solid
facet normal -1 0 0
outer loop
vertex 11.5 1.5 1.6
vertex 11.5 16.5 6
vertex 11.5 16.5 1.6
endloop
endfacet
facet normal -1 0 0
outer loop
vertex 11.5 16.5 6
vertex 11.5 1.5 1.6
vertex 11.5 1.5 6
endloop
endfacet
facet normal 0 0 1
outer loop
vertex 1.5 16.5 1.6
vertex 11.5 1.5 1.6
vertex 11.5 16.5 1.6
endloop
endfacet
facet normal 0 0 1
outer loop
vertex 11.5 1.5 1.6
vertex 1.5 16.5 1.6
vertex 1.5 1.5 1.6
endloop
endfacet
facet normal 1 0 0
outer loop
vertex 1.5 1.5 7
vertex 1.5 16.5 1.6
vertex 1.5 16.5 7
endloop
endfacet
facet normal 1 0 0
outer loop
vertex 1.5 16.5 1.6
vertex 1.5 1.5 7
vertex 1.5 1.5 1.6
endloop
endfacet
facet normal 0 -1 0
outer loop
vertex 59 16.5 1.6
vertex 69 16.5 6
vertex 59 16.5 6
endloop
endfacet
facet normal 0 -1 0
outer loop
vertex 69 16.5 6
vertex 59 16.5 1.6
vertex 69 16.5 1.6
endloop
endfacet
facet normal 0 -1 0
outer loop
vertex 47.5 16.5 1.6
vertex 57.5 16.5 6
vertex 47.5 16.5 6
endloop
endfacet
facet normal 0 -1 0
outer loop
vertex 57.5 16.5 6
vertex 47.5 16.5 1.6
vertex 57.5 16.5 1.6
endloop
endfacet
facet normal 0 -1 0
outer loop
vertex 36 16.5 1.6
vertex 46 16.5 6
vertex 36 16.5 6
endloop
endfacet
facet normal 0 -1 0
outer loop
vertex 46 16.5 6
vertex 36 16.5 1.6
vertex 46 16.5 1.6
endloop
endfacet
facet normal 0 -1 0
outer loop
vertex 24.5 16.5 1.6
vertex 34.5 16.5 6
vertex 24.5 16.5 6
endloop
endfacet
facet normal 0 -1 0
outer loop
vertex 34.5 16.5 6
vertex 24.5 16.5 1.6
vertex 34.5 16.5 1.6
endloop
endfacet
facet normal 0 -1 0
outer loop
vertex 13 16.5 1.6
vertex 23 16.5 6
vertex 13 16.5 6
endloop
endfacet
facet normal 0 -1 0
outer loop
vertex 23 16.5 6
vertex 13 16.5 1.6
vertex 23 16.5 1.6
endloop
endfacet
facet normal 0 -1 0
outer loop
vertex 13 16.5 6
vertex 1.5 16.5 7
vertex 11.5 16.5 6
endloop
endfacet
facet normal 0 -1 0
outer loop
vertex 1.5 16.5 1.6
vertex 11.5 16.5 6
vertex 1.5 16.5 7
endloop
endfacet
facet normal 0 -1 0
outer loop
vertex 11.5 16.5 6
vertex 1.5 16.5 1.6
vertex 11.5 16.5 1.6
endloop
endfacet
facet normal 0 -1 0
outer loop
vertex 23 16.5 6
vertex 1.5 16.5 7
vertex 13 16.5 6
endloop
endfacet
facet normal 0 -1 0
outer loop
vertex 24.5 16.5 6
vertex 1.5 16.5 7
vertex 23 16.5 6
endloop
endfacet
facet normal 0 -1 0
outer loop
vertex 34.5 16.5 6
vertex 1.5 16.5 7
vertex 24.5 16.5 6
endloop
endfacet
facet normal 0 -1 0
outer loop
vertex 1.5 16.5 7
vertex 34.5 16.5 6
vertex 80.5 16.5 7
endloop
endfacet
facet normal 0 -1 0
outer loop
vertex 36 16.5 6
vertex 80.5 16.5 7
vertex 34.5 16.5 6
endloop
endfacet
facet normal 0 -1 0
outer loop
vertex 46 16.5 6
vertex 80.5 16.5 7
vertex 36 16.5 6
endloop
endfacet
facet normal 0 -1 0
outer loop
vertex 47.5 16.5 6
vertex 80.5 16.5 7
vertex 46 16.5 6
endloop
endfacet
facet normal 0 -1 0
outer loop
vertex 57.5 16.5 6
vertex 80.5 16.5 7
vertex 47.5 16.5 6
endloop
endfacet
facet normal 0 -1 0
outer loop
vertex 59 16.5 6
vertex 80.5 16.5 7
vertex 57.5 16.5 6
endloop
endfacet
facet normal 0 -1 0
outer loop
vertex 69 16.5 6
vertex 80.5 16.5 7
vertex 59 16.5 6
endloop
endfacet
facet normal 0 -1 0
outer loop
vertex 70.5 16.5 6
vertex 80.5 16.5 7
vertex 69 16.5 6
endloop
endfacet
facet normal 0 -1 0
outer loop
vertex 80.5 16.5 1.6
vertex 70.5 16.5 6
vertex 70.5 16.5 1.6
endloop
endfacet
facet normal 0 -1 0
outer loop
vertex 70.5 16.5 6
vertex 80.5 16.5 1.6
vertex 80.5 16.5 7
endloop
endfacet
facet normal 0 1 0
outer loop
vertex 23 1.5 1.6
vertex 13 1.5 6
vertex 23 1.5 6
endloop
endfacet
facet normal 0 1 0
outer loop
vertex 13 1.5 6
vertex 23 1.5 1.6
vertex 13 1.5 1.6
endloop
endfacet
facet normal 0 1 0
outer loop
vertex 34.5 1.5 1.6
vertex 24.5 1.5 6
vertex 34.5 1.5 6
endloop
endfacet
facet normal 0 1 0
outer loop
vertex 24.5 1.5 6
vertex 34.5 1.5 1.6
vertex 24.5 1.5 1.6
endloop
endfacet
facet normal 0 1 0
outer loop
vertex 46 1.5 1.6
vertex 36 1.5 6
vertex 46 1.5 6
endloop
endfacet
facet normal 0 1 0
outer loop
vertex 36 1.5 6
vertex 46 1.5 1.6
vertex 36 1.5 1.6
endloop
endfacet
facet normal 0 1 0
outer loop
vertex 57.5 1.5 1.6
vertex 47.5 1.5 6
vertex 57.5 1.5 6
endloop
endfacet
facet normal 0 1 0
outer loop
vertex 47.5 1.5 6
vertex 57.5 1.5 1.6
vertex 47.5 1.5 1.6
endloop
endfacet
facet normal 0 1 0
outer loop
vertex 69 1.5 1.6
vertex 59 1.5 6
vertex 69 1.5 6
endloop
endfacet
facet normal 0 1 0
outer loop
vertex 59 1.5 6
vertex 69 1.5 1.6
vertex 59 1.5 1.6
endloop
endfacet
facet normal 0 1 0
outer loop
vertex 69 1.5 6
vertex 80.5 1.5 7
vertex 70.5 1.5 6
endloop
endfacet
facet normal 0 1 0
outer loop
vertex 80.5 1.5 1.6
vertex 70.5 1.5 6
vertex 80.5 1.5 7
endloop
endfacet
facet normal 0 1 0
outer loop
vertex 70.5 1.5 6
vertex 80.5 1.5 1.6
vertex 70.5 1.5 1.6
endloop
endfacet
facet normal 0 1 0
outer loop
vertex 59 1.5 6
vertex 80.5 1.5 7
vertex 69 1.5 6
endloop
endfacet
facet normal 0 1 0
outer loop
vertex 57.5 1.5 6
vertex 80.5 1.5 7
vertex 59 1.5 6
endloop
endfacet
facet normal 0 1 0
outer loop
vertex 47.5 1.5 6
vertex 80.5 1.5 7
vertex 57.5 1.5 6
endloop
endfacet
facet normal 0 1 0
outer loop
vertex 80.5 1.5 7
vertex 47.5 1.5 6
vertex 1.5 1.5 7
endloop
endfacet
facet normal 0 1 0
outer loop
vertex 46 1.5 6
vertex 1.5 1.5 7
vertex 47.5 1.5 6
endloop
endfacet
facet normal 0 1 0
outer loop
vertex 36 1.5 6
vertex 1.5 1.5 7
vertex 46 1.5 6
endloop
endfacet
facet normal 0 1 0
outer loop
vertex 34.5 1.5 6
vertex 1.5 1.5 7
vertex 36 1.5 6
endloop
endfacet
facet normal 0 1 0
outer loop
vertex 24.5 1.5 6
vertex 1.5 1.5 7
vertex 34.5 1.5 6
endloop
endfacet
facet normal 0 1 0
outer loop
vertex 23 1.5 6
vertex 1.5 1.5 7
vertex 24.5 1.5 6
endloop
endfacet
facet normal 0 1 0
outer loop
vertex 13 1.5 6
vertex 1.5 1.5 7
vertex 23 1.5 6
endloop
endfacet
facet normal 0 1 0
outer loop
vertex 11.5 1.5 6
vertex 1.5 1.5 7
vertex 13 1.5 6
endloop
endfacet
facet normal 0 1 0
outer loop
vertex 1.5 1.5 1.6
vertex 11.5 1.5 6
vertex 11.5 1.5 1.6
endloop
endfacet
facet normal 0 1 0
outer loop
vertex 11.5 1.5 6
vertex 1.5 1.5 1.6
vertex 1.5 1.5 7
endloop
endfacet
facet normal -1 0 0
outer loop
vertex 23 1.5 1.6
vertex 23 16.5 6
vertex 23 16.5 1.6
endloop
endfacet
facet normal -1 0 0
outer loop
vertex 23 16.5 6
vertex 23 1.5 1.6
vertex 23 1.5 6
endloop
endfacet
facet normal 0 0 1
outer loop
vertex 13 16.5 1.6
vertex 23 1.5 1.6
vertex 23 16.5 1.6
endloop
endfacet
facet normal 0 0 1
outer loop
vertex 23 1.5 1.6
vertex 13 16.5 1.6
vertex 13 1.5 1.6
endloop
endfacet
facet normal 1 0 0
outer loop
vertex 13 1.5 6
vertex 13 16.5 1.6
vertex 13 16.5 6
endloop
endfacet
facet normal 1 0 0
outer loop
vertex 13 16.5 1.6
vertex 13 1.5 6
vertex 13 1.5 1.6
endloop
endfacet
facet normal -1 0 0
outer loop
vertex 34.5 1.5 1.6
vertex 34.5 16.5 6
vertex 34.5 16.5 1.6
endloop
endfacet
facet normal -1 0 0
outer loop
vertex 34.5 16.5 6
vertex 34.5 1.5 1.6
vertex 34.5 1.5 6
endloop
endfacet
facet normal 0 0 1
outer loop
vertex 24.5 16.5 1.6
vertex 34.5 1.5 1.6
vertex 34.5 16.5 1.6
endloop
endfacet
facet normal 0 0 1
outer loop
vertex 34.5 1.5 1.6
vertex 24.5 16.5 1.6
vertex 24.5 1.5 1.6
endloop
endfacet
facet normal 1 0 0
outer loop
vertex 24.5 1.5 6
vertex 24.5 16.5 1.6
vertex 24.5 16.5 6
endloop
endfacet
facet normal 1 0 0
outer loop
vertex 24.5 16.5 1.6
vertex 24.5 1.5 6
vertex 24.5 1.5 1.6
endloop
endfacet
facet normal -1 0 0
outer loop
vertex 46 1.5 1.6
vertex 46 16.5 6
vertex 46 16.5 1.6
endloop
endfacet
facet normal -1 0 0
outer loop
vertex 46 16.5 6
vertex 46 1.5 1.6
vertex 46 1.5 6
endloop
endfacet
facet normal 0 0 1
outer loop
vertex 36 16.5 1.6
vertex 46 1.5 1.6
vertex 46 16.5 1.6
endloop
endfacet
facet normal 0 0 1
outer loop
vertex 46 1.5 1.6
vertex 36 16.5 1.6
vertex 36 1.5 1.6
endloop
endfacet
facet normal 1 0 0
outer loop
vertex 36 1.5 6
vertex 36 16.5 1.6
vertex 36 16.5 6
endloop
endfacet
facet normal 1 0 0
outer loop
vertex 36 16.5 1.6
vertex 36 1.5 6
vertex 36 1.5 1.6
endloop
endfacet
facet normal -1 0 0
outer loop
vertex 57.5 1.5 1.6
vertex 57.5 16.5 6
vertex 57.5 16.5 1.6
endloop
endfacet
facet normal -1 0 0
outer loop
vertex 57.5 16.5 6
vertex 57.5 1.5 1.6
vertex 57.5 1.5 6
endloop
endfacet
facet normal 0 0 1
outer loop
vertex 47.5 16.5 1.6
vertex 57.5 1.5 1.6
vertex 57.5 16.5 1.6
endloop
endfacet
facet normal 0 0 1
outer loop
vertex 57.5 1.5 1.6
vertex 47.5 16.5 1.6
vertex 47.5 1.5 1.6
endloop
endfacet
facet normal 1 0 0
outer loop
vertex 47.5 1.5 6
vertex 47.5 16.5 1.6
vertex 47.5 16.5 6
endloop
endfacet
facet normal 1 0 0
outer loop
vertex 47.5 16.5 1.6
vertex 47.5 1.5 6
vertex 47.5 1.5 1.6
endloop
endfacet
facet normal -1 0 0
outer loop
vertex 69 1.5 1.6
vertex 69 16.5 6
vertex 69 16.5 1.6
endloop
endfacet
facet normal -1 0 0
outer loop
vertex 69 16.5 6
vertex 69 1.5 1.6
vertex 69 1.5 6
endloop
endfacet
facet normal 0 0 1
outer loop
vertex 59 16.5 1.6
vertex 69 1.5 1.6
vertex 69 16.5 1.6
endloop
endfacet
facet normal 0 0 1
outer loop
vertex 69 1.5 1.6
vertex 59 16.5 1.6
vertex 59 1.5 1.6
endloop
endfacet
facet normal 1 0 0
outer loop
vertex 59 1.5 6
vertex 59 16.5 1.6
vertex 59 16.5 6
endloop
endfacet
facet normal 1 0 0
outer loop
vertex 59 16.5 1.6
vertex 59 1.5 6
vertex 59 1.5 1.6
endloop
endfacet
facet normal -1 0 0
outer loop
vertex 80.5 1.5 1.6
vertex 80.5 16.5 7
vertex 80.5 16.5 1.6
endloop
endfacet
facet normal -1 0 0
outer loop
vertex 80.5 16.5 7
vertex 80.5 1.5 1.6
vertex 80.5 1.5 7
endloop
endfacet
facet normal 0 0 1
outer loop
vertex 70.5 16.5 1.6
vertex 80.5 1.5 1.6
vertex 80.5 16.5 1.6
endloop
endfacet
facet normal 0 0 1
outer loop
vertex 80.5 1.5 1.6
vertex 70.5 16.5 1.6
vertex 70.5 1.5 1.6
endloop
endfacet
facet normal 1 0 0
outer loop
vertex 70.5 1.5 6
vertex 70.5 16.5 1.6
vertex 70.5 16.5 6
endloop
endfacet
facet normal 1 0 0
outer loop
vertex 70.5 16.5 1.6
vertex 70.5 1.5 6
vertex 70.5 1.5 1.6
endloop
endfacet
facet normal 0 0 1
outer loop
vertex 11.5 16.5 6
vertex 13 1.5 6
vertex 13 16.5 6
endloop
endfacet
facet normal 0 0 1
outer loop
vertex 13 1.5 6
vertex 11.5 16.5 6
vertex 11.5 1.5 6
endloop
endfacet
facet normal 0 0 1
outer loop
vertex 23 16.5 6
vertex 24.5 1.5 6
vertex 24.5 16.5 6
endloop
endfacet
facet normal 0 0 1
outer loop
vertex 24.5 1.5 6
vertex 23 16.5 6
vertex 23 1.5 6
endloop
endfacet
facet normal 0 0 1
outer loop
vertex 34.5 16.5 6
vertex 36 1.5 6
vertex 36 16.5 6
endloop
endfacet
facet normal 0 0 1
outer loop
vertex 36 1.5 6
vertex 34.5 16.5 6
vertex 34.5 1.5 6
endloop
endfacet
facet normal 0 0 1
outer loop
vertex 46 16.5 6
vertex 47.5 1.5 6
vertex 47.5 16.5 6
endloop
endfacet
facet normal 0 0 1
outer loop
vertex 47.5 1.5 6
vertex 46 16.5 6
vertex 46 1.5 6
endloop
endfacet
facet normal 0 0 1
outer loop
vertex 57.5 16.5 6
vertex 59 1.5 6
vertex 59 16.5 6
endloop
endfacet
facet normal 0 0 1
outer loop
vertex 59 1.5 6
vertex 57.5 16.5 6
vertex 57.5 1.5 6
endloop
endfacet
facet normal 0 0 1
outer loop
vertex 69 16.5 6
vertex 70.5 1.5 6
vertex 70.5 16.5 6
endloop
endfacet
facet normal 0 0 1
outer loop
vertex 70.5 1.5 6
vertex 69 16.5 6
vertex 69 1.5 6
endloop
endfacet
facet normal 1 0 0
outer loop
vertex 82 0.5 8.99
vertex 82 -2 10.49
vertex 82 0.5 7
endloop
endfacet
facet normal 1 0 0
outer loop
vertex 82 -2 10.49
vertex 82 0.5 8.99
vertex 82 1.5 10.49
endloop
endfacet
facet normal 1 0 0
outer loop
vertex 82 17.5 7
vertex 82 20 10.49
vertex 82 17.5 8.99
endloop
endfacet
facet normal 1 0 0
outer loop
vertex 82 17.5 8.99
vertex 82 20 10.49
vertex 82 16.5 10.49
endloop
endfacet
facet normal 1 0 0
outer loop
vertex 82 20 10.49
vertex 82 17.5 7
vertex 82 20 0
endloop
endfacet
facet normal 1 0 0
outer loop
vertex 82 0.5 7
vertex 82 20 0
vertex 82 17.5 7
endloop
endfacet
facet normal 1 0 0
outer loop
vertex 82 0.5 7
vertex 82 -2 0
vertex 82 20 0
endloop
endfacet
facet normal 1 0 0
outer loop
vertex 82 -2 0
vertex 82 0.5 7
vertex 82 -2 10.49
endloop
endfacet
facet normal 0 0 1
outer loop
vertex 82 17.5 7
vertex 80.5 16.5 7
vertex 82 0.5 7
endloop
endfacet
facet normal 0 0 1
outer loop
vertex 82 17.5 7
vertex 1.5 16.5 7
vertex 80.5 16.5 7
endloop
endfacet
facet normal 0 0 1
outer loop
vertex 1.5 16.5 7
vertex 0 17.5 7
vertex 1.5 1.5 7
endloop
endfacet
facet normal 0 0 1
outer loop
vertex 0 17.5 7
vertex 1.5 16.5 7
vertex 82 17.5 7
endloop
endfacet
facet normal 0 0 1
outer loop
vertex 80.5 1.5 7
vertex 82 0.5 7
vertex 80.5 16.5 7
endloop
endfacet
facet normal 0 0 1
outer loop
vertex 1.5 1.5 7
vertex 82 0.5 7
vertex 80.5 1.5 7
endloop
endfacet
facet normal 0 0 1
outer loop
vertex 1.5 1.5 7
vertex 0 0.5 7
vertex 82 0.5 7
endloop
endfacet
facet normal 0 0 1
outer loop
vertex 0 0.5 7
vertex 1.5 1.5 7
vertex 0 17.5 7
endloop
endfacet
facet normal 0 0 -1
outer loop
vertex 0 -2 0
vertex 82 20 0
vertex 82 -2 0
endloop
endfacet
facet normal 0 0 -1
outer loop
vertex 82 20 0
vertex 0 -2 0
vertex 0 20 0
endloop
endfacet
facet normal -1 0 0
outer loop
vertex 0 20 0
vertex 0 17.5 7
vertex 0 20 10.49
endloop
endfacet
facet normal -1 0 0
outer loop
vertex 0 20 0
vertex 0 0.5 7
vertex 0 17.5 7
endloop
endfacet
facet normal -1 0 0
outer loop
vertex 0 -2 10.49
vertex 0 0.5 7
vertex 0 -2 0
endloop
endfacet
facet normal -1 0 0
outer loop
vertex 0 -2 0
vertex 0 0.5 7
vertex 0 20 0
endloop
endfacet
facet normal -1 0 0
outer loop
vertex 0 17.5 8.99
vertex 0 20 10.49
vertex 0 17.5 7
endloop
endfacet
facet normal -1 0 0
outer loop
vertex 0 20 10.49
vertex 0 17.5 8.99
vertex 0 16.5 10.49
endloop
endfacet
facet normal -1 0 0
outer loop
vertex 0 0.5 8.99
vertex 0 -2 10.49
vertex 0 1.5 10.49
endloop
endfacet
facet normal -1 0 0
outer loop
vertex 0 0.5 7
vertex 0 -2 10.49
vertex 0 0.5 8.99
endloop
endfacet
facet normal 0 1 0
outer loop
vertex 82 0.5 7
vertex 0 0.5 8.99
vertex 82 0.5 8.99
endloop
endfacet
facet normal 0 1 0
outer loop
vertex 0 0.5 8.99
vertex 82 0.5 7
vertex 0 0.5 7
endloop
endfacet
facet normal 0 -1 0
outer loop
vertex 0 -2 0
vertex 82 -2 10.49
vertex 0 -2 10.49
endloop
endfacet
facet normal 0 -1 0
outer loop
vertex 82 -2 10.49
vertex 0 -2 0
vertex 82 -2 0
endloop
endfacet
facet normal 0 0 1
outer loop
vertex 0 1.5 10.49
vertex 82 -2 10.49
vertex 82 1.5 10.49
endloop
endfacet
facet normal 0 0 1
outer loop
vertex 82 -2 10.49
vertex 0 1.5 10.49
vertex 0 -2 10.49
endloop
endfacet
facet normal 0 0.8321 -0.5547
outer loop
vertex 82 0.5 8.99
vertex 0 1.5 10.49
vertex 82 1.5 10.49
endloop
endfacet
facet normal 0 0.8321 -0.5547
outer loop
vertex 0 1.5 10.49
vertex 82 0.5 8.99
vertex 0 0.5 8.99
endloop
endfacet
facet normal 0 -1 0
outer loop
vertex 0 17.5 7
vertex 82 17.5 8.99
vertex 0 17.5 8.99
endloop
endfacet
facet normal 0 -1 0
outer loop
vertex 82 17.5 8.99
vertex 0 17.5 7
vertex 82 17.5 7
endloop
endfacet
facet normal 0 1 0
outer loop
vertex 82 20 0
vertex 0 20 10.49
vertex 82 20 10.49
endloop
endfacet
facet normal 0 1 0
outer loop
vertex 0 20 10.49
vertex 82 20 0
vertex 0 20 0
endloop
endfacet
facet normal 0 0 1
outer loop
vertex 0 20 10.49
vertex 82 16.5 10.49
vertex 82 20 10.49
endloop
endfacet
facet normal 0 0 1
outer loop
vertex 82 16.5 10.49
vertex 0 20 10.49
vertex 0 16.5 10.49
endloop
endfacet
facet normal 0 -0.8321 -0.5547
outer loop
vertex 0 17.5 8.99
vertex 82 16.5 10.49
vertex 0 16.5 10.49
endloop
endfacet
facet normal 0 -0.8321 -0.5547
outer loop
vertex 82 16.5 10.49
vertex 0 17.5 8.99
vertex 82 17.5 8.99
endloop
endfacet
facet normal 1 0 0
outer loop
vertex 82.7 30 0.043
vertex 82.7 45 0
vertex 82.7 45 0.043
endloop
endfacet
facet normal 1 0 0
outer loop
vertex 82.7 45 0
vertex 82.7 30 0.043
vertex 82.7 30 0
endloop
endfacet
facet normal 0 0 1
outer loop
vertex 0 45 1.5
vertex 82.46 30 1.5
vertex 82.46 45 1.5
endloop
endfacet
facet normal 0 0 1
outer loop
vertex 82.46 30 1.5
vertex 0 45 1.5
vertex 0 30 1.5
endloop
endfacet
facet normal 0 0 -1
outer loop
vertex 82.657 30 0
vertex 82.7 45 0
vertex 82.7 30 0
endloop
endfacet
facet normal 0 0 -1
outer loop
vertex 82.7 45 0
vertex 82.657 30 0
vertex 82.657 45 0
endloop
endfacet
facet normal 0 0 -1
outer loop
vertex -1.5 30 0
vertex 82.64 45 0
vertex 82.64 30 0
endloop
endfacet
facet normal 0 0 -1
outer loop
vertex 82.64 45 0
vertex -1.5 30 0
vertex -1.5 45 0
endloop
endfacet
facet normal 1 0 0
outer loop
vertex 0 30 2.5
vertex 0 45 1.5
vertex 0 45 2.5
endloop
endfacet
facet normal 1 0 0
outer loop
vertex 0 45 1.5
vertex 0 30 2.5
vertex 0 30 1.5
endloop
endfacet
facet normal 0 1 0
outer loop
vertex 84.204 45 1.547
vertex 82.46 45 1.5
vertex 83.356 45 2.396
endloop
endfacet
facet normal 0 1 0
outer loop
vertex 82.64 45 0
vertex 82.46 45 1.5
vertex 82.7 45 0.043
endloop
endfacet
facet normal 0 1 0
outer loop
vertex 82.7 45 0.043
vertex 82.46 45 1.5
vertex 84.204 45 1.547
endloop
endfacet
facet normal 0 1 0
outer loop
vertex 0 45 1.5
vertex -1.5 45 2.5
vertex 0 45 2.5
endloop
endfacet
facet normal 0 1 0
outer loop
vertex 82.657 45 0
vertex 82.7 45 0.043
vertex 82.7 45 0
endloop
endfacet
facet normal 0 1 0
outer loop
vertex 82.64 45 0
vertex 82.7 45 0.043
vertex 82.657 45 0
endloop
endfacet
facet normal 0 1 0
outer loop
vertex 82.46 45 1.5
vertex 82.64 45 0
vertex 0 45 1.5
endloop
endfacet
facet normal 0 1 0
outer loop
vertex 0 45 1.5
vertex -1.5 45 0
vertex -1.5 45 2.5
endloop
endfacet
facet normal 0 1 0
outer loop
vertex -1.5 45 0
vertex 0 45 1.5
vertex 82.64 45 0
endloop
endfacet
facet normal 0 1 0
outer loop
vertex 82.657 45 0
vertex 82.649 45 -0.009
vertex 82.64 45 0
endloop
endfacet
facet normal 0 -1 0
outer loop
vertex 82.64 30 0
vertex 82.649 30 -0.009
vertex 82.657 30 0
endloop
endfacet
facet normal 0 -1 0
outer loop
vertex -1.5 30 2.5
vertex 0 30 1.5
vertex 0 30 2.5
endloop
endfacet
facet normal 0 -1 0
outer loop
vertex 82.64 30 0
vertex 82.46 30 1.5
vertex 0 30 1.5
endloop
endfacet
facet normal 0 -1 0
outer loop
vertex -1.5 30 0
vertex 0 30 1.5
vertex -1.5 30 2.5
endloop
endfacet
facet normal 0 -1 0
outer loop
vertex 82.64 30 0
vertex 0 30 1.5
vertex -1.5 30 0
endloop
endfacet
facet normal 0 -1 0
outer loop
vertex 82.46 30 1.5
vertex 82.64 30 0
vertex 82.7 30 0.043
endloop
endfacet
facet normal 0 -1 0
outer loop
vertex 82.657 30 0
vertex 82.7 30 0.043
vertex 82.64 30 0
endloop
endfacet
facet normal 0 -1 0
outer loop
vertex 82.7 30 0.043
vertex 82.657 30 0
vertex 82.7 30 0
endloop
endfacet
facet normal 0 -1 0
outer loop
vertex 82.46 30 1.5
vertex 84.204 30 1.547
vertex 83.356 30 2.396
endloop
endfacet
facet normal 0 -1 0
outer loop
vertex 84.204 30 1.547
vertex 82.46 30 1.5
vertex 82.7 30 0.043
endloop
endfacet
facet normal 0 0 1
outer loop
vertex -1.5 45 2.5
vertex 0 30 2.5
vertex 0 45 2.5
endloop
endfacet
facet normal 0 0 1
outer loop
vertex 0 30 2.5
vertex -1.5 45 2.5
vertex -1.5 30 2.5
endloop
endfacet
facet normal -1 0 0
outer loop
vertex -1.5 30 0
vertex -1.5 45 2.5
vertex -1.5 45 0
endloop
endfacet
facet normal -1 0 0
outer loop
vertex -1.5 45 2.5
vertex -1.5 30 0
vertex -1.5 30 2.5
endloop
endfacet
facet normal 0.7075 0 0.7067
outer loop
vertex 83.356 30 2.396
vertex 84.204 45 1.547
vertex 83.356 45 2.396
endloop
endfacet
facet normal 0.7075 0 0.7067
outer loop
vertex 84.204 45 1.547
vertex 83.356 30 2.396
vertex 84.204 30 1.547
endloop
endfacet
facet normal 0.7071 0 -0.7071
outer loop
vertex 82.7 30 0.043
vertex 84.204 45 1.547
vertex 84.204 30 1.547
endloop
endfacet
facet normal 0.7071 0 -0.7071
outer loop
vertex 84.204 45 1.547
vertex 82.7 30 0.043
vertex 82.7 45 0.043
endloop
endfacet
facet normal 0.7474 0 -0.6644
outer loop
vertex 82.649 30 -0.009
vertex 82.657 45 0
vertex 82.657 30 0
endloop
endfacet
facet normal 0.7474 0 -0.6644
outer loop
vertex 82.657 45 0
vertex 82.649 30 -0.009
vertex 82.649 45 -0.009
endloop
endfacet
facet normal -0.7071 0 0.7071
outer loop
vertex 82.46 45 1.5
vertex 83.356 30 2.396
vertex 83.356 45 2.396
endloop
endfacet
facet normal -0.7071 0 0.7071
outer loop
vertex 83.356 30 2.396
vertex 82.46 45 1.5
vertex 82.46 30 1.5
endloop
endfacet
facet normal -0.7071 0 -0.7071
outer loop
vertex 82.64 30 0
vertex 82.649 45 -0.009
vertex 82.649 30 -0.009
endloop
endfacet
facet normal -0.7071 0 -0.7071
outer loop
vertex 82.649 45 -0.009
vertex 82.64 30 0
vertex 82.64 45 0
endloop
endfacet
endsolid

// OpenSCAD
//widths for the pill compartments
wp = 10;
//depth for the pill compartments
dp = 15;

//wall size
ws = 1.5;
//side wall size
sws = 3.5;
//ridge width
rw = 1;
//ridge height
rh = 2;
//ridge thing height
rth = 1.5;
//pill box height
he = 7;
//wall height (center ones)
wh = he-1;

//tolerance
tol = 1;


difference()
{

cube([wp*7+ws*8, dp+ws*2, he]);

union()
{
translate([ws,ws,0])
for (n = [0:6])
{
translate([n*wp+n*ws,0,ws+.1])
cube([wp,dp,10]);
}
translate([ws,ws,wh])
cube([wp*7+ws*6,dp,he-wh+.1]);

}
}


//lid thingy
module lidthingy()
{
translate([0,-sws+ws,0])
cube([ws*8+wp*7,sws-rw,he+rh]);


//ridge thingy
translate([0,-sws+ws,he+rh+rth-.01])
rotate([0,90,0])
//cylinder(r=sws/2, h=10, $fn=6);
linear_extrude(height=wp*7+ws*8)
polygon(points=[[0,0],[rth,0],[rth,sws-rw], [0,sws]]);

}


lidthingy();

mirror([0,1,0])
translate([0,-dp-ws*2,0])
lidthingy();


//lid
translate([0,30,0])
{

cube([wp*7+ws*8+.7,dp+rw*2-tol*2,1.5]);
translate([-1.5,0,0])
cube([1.5,dp+rw*2-tol*2,2.5]);

translate([wp*7+ws*8-.2,0,.7*1.2])
rotate([0,45,0])
cube([1.2,dp+rw*2-tol*2,2.2]);

}
